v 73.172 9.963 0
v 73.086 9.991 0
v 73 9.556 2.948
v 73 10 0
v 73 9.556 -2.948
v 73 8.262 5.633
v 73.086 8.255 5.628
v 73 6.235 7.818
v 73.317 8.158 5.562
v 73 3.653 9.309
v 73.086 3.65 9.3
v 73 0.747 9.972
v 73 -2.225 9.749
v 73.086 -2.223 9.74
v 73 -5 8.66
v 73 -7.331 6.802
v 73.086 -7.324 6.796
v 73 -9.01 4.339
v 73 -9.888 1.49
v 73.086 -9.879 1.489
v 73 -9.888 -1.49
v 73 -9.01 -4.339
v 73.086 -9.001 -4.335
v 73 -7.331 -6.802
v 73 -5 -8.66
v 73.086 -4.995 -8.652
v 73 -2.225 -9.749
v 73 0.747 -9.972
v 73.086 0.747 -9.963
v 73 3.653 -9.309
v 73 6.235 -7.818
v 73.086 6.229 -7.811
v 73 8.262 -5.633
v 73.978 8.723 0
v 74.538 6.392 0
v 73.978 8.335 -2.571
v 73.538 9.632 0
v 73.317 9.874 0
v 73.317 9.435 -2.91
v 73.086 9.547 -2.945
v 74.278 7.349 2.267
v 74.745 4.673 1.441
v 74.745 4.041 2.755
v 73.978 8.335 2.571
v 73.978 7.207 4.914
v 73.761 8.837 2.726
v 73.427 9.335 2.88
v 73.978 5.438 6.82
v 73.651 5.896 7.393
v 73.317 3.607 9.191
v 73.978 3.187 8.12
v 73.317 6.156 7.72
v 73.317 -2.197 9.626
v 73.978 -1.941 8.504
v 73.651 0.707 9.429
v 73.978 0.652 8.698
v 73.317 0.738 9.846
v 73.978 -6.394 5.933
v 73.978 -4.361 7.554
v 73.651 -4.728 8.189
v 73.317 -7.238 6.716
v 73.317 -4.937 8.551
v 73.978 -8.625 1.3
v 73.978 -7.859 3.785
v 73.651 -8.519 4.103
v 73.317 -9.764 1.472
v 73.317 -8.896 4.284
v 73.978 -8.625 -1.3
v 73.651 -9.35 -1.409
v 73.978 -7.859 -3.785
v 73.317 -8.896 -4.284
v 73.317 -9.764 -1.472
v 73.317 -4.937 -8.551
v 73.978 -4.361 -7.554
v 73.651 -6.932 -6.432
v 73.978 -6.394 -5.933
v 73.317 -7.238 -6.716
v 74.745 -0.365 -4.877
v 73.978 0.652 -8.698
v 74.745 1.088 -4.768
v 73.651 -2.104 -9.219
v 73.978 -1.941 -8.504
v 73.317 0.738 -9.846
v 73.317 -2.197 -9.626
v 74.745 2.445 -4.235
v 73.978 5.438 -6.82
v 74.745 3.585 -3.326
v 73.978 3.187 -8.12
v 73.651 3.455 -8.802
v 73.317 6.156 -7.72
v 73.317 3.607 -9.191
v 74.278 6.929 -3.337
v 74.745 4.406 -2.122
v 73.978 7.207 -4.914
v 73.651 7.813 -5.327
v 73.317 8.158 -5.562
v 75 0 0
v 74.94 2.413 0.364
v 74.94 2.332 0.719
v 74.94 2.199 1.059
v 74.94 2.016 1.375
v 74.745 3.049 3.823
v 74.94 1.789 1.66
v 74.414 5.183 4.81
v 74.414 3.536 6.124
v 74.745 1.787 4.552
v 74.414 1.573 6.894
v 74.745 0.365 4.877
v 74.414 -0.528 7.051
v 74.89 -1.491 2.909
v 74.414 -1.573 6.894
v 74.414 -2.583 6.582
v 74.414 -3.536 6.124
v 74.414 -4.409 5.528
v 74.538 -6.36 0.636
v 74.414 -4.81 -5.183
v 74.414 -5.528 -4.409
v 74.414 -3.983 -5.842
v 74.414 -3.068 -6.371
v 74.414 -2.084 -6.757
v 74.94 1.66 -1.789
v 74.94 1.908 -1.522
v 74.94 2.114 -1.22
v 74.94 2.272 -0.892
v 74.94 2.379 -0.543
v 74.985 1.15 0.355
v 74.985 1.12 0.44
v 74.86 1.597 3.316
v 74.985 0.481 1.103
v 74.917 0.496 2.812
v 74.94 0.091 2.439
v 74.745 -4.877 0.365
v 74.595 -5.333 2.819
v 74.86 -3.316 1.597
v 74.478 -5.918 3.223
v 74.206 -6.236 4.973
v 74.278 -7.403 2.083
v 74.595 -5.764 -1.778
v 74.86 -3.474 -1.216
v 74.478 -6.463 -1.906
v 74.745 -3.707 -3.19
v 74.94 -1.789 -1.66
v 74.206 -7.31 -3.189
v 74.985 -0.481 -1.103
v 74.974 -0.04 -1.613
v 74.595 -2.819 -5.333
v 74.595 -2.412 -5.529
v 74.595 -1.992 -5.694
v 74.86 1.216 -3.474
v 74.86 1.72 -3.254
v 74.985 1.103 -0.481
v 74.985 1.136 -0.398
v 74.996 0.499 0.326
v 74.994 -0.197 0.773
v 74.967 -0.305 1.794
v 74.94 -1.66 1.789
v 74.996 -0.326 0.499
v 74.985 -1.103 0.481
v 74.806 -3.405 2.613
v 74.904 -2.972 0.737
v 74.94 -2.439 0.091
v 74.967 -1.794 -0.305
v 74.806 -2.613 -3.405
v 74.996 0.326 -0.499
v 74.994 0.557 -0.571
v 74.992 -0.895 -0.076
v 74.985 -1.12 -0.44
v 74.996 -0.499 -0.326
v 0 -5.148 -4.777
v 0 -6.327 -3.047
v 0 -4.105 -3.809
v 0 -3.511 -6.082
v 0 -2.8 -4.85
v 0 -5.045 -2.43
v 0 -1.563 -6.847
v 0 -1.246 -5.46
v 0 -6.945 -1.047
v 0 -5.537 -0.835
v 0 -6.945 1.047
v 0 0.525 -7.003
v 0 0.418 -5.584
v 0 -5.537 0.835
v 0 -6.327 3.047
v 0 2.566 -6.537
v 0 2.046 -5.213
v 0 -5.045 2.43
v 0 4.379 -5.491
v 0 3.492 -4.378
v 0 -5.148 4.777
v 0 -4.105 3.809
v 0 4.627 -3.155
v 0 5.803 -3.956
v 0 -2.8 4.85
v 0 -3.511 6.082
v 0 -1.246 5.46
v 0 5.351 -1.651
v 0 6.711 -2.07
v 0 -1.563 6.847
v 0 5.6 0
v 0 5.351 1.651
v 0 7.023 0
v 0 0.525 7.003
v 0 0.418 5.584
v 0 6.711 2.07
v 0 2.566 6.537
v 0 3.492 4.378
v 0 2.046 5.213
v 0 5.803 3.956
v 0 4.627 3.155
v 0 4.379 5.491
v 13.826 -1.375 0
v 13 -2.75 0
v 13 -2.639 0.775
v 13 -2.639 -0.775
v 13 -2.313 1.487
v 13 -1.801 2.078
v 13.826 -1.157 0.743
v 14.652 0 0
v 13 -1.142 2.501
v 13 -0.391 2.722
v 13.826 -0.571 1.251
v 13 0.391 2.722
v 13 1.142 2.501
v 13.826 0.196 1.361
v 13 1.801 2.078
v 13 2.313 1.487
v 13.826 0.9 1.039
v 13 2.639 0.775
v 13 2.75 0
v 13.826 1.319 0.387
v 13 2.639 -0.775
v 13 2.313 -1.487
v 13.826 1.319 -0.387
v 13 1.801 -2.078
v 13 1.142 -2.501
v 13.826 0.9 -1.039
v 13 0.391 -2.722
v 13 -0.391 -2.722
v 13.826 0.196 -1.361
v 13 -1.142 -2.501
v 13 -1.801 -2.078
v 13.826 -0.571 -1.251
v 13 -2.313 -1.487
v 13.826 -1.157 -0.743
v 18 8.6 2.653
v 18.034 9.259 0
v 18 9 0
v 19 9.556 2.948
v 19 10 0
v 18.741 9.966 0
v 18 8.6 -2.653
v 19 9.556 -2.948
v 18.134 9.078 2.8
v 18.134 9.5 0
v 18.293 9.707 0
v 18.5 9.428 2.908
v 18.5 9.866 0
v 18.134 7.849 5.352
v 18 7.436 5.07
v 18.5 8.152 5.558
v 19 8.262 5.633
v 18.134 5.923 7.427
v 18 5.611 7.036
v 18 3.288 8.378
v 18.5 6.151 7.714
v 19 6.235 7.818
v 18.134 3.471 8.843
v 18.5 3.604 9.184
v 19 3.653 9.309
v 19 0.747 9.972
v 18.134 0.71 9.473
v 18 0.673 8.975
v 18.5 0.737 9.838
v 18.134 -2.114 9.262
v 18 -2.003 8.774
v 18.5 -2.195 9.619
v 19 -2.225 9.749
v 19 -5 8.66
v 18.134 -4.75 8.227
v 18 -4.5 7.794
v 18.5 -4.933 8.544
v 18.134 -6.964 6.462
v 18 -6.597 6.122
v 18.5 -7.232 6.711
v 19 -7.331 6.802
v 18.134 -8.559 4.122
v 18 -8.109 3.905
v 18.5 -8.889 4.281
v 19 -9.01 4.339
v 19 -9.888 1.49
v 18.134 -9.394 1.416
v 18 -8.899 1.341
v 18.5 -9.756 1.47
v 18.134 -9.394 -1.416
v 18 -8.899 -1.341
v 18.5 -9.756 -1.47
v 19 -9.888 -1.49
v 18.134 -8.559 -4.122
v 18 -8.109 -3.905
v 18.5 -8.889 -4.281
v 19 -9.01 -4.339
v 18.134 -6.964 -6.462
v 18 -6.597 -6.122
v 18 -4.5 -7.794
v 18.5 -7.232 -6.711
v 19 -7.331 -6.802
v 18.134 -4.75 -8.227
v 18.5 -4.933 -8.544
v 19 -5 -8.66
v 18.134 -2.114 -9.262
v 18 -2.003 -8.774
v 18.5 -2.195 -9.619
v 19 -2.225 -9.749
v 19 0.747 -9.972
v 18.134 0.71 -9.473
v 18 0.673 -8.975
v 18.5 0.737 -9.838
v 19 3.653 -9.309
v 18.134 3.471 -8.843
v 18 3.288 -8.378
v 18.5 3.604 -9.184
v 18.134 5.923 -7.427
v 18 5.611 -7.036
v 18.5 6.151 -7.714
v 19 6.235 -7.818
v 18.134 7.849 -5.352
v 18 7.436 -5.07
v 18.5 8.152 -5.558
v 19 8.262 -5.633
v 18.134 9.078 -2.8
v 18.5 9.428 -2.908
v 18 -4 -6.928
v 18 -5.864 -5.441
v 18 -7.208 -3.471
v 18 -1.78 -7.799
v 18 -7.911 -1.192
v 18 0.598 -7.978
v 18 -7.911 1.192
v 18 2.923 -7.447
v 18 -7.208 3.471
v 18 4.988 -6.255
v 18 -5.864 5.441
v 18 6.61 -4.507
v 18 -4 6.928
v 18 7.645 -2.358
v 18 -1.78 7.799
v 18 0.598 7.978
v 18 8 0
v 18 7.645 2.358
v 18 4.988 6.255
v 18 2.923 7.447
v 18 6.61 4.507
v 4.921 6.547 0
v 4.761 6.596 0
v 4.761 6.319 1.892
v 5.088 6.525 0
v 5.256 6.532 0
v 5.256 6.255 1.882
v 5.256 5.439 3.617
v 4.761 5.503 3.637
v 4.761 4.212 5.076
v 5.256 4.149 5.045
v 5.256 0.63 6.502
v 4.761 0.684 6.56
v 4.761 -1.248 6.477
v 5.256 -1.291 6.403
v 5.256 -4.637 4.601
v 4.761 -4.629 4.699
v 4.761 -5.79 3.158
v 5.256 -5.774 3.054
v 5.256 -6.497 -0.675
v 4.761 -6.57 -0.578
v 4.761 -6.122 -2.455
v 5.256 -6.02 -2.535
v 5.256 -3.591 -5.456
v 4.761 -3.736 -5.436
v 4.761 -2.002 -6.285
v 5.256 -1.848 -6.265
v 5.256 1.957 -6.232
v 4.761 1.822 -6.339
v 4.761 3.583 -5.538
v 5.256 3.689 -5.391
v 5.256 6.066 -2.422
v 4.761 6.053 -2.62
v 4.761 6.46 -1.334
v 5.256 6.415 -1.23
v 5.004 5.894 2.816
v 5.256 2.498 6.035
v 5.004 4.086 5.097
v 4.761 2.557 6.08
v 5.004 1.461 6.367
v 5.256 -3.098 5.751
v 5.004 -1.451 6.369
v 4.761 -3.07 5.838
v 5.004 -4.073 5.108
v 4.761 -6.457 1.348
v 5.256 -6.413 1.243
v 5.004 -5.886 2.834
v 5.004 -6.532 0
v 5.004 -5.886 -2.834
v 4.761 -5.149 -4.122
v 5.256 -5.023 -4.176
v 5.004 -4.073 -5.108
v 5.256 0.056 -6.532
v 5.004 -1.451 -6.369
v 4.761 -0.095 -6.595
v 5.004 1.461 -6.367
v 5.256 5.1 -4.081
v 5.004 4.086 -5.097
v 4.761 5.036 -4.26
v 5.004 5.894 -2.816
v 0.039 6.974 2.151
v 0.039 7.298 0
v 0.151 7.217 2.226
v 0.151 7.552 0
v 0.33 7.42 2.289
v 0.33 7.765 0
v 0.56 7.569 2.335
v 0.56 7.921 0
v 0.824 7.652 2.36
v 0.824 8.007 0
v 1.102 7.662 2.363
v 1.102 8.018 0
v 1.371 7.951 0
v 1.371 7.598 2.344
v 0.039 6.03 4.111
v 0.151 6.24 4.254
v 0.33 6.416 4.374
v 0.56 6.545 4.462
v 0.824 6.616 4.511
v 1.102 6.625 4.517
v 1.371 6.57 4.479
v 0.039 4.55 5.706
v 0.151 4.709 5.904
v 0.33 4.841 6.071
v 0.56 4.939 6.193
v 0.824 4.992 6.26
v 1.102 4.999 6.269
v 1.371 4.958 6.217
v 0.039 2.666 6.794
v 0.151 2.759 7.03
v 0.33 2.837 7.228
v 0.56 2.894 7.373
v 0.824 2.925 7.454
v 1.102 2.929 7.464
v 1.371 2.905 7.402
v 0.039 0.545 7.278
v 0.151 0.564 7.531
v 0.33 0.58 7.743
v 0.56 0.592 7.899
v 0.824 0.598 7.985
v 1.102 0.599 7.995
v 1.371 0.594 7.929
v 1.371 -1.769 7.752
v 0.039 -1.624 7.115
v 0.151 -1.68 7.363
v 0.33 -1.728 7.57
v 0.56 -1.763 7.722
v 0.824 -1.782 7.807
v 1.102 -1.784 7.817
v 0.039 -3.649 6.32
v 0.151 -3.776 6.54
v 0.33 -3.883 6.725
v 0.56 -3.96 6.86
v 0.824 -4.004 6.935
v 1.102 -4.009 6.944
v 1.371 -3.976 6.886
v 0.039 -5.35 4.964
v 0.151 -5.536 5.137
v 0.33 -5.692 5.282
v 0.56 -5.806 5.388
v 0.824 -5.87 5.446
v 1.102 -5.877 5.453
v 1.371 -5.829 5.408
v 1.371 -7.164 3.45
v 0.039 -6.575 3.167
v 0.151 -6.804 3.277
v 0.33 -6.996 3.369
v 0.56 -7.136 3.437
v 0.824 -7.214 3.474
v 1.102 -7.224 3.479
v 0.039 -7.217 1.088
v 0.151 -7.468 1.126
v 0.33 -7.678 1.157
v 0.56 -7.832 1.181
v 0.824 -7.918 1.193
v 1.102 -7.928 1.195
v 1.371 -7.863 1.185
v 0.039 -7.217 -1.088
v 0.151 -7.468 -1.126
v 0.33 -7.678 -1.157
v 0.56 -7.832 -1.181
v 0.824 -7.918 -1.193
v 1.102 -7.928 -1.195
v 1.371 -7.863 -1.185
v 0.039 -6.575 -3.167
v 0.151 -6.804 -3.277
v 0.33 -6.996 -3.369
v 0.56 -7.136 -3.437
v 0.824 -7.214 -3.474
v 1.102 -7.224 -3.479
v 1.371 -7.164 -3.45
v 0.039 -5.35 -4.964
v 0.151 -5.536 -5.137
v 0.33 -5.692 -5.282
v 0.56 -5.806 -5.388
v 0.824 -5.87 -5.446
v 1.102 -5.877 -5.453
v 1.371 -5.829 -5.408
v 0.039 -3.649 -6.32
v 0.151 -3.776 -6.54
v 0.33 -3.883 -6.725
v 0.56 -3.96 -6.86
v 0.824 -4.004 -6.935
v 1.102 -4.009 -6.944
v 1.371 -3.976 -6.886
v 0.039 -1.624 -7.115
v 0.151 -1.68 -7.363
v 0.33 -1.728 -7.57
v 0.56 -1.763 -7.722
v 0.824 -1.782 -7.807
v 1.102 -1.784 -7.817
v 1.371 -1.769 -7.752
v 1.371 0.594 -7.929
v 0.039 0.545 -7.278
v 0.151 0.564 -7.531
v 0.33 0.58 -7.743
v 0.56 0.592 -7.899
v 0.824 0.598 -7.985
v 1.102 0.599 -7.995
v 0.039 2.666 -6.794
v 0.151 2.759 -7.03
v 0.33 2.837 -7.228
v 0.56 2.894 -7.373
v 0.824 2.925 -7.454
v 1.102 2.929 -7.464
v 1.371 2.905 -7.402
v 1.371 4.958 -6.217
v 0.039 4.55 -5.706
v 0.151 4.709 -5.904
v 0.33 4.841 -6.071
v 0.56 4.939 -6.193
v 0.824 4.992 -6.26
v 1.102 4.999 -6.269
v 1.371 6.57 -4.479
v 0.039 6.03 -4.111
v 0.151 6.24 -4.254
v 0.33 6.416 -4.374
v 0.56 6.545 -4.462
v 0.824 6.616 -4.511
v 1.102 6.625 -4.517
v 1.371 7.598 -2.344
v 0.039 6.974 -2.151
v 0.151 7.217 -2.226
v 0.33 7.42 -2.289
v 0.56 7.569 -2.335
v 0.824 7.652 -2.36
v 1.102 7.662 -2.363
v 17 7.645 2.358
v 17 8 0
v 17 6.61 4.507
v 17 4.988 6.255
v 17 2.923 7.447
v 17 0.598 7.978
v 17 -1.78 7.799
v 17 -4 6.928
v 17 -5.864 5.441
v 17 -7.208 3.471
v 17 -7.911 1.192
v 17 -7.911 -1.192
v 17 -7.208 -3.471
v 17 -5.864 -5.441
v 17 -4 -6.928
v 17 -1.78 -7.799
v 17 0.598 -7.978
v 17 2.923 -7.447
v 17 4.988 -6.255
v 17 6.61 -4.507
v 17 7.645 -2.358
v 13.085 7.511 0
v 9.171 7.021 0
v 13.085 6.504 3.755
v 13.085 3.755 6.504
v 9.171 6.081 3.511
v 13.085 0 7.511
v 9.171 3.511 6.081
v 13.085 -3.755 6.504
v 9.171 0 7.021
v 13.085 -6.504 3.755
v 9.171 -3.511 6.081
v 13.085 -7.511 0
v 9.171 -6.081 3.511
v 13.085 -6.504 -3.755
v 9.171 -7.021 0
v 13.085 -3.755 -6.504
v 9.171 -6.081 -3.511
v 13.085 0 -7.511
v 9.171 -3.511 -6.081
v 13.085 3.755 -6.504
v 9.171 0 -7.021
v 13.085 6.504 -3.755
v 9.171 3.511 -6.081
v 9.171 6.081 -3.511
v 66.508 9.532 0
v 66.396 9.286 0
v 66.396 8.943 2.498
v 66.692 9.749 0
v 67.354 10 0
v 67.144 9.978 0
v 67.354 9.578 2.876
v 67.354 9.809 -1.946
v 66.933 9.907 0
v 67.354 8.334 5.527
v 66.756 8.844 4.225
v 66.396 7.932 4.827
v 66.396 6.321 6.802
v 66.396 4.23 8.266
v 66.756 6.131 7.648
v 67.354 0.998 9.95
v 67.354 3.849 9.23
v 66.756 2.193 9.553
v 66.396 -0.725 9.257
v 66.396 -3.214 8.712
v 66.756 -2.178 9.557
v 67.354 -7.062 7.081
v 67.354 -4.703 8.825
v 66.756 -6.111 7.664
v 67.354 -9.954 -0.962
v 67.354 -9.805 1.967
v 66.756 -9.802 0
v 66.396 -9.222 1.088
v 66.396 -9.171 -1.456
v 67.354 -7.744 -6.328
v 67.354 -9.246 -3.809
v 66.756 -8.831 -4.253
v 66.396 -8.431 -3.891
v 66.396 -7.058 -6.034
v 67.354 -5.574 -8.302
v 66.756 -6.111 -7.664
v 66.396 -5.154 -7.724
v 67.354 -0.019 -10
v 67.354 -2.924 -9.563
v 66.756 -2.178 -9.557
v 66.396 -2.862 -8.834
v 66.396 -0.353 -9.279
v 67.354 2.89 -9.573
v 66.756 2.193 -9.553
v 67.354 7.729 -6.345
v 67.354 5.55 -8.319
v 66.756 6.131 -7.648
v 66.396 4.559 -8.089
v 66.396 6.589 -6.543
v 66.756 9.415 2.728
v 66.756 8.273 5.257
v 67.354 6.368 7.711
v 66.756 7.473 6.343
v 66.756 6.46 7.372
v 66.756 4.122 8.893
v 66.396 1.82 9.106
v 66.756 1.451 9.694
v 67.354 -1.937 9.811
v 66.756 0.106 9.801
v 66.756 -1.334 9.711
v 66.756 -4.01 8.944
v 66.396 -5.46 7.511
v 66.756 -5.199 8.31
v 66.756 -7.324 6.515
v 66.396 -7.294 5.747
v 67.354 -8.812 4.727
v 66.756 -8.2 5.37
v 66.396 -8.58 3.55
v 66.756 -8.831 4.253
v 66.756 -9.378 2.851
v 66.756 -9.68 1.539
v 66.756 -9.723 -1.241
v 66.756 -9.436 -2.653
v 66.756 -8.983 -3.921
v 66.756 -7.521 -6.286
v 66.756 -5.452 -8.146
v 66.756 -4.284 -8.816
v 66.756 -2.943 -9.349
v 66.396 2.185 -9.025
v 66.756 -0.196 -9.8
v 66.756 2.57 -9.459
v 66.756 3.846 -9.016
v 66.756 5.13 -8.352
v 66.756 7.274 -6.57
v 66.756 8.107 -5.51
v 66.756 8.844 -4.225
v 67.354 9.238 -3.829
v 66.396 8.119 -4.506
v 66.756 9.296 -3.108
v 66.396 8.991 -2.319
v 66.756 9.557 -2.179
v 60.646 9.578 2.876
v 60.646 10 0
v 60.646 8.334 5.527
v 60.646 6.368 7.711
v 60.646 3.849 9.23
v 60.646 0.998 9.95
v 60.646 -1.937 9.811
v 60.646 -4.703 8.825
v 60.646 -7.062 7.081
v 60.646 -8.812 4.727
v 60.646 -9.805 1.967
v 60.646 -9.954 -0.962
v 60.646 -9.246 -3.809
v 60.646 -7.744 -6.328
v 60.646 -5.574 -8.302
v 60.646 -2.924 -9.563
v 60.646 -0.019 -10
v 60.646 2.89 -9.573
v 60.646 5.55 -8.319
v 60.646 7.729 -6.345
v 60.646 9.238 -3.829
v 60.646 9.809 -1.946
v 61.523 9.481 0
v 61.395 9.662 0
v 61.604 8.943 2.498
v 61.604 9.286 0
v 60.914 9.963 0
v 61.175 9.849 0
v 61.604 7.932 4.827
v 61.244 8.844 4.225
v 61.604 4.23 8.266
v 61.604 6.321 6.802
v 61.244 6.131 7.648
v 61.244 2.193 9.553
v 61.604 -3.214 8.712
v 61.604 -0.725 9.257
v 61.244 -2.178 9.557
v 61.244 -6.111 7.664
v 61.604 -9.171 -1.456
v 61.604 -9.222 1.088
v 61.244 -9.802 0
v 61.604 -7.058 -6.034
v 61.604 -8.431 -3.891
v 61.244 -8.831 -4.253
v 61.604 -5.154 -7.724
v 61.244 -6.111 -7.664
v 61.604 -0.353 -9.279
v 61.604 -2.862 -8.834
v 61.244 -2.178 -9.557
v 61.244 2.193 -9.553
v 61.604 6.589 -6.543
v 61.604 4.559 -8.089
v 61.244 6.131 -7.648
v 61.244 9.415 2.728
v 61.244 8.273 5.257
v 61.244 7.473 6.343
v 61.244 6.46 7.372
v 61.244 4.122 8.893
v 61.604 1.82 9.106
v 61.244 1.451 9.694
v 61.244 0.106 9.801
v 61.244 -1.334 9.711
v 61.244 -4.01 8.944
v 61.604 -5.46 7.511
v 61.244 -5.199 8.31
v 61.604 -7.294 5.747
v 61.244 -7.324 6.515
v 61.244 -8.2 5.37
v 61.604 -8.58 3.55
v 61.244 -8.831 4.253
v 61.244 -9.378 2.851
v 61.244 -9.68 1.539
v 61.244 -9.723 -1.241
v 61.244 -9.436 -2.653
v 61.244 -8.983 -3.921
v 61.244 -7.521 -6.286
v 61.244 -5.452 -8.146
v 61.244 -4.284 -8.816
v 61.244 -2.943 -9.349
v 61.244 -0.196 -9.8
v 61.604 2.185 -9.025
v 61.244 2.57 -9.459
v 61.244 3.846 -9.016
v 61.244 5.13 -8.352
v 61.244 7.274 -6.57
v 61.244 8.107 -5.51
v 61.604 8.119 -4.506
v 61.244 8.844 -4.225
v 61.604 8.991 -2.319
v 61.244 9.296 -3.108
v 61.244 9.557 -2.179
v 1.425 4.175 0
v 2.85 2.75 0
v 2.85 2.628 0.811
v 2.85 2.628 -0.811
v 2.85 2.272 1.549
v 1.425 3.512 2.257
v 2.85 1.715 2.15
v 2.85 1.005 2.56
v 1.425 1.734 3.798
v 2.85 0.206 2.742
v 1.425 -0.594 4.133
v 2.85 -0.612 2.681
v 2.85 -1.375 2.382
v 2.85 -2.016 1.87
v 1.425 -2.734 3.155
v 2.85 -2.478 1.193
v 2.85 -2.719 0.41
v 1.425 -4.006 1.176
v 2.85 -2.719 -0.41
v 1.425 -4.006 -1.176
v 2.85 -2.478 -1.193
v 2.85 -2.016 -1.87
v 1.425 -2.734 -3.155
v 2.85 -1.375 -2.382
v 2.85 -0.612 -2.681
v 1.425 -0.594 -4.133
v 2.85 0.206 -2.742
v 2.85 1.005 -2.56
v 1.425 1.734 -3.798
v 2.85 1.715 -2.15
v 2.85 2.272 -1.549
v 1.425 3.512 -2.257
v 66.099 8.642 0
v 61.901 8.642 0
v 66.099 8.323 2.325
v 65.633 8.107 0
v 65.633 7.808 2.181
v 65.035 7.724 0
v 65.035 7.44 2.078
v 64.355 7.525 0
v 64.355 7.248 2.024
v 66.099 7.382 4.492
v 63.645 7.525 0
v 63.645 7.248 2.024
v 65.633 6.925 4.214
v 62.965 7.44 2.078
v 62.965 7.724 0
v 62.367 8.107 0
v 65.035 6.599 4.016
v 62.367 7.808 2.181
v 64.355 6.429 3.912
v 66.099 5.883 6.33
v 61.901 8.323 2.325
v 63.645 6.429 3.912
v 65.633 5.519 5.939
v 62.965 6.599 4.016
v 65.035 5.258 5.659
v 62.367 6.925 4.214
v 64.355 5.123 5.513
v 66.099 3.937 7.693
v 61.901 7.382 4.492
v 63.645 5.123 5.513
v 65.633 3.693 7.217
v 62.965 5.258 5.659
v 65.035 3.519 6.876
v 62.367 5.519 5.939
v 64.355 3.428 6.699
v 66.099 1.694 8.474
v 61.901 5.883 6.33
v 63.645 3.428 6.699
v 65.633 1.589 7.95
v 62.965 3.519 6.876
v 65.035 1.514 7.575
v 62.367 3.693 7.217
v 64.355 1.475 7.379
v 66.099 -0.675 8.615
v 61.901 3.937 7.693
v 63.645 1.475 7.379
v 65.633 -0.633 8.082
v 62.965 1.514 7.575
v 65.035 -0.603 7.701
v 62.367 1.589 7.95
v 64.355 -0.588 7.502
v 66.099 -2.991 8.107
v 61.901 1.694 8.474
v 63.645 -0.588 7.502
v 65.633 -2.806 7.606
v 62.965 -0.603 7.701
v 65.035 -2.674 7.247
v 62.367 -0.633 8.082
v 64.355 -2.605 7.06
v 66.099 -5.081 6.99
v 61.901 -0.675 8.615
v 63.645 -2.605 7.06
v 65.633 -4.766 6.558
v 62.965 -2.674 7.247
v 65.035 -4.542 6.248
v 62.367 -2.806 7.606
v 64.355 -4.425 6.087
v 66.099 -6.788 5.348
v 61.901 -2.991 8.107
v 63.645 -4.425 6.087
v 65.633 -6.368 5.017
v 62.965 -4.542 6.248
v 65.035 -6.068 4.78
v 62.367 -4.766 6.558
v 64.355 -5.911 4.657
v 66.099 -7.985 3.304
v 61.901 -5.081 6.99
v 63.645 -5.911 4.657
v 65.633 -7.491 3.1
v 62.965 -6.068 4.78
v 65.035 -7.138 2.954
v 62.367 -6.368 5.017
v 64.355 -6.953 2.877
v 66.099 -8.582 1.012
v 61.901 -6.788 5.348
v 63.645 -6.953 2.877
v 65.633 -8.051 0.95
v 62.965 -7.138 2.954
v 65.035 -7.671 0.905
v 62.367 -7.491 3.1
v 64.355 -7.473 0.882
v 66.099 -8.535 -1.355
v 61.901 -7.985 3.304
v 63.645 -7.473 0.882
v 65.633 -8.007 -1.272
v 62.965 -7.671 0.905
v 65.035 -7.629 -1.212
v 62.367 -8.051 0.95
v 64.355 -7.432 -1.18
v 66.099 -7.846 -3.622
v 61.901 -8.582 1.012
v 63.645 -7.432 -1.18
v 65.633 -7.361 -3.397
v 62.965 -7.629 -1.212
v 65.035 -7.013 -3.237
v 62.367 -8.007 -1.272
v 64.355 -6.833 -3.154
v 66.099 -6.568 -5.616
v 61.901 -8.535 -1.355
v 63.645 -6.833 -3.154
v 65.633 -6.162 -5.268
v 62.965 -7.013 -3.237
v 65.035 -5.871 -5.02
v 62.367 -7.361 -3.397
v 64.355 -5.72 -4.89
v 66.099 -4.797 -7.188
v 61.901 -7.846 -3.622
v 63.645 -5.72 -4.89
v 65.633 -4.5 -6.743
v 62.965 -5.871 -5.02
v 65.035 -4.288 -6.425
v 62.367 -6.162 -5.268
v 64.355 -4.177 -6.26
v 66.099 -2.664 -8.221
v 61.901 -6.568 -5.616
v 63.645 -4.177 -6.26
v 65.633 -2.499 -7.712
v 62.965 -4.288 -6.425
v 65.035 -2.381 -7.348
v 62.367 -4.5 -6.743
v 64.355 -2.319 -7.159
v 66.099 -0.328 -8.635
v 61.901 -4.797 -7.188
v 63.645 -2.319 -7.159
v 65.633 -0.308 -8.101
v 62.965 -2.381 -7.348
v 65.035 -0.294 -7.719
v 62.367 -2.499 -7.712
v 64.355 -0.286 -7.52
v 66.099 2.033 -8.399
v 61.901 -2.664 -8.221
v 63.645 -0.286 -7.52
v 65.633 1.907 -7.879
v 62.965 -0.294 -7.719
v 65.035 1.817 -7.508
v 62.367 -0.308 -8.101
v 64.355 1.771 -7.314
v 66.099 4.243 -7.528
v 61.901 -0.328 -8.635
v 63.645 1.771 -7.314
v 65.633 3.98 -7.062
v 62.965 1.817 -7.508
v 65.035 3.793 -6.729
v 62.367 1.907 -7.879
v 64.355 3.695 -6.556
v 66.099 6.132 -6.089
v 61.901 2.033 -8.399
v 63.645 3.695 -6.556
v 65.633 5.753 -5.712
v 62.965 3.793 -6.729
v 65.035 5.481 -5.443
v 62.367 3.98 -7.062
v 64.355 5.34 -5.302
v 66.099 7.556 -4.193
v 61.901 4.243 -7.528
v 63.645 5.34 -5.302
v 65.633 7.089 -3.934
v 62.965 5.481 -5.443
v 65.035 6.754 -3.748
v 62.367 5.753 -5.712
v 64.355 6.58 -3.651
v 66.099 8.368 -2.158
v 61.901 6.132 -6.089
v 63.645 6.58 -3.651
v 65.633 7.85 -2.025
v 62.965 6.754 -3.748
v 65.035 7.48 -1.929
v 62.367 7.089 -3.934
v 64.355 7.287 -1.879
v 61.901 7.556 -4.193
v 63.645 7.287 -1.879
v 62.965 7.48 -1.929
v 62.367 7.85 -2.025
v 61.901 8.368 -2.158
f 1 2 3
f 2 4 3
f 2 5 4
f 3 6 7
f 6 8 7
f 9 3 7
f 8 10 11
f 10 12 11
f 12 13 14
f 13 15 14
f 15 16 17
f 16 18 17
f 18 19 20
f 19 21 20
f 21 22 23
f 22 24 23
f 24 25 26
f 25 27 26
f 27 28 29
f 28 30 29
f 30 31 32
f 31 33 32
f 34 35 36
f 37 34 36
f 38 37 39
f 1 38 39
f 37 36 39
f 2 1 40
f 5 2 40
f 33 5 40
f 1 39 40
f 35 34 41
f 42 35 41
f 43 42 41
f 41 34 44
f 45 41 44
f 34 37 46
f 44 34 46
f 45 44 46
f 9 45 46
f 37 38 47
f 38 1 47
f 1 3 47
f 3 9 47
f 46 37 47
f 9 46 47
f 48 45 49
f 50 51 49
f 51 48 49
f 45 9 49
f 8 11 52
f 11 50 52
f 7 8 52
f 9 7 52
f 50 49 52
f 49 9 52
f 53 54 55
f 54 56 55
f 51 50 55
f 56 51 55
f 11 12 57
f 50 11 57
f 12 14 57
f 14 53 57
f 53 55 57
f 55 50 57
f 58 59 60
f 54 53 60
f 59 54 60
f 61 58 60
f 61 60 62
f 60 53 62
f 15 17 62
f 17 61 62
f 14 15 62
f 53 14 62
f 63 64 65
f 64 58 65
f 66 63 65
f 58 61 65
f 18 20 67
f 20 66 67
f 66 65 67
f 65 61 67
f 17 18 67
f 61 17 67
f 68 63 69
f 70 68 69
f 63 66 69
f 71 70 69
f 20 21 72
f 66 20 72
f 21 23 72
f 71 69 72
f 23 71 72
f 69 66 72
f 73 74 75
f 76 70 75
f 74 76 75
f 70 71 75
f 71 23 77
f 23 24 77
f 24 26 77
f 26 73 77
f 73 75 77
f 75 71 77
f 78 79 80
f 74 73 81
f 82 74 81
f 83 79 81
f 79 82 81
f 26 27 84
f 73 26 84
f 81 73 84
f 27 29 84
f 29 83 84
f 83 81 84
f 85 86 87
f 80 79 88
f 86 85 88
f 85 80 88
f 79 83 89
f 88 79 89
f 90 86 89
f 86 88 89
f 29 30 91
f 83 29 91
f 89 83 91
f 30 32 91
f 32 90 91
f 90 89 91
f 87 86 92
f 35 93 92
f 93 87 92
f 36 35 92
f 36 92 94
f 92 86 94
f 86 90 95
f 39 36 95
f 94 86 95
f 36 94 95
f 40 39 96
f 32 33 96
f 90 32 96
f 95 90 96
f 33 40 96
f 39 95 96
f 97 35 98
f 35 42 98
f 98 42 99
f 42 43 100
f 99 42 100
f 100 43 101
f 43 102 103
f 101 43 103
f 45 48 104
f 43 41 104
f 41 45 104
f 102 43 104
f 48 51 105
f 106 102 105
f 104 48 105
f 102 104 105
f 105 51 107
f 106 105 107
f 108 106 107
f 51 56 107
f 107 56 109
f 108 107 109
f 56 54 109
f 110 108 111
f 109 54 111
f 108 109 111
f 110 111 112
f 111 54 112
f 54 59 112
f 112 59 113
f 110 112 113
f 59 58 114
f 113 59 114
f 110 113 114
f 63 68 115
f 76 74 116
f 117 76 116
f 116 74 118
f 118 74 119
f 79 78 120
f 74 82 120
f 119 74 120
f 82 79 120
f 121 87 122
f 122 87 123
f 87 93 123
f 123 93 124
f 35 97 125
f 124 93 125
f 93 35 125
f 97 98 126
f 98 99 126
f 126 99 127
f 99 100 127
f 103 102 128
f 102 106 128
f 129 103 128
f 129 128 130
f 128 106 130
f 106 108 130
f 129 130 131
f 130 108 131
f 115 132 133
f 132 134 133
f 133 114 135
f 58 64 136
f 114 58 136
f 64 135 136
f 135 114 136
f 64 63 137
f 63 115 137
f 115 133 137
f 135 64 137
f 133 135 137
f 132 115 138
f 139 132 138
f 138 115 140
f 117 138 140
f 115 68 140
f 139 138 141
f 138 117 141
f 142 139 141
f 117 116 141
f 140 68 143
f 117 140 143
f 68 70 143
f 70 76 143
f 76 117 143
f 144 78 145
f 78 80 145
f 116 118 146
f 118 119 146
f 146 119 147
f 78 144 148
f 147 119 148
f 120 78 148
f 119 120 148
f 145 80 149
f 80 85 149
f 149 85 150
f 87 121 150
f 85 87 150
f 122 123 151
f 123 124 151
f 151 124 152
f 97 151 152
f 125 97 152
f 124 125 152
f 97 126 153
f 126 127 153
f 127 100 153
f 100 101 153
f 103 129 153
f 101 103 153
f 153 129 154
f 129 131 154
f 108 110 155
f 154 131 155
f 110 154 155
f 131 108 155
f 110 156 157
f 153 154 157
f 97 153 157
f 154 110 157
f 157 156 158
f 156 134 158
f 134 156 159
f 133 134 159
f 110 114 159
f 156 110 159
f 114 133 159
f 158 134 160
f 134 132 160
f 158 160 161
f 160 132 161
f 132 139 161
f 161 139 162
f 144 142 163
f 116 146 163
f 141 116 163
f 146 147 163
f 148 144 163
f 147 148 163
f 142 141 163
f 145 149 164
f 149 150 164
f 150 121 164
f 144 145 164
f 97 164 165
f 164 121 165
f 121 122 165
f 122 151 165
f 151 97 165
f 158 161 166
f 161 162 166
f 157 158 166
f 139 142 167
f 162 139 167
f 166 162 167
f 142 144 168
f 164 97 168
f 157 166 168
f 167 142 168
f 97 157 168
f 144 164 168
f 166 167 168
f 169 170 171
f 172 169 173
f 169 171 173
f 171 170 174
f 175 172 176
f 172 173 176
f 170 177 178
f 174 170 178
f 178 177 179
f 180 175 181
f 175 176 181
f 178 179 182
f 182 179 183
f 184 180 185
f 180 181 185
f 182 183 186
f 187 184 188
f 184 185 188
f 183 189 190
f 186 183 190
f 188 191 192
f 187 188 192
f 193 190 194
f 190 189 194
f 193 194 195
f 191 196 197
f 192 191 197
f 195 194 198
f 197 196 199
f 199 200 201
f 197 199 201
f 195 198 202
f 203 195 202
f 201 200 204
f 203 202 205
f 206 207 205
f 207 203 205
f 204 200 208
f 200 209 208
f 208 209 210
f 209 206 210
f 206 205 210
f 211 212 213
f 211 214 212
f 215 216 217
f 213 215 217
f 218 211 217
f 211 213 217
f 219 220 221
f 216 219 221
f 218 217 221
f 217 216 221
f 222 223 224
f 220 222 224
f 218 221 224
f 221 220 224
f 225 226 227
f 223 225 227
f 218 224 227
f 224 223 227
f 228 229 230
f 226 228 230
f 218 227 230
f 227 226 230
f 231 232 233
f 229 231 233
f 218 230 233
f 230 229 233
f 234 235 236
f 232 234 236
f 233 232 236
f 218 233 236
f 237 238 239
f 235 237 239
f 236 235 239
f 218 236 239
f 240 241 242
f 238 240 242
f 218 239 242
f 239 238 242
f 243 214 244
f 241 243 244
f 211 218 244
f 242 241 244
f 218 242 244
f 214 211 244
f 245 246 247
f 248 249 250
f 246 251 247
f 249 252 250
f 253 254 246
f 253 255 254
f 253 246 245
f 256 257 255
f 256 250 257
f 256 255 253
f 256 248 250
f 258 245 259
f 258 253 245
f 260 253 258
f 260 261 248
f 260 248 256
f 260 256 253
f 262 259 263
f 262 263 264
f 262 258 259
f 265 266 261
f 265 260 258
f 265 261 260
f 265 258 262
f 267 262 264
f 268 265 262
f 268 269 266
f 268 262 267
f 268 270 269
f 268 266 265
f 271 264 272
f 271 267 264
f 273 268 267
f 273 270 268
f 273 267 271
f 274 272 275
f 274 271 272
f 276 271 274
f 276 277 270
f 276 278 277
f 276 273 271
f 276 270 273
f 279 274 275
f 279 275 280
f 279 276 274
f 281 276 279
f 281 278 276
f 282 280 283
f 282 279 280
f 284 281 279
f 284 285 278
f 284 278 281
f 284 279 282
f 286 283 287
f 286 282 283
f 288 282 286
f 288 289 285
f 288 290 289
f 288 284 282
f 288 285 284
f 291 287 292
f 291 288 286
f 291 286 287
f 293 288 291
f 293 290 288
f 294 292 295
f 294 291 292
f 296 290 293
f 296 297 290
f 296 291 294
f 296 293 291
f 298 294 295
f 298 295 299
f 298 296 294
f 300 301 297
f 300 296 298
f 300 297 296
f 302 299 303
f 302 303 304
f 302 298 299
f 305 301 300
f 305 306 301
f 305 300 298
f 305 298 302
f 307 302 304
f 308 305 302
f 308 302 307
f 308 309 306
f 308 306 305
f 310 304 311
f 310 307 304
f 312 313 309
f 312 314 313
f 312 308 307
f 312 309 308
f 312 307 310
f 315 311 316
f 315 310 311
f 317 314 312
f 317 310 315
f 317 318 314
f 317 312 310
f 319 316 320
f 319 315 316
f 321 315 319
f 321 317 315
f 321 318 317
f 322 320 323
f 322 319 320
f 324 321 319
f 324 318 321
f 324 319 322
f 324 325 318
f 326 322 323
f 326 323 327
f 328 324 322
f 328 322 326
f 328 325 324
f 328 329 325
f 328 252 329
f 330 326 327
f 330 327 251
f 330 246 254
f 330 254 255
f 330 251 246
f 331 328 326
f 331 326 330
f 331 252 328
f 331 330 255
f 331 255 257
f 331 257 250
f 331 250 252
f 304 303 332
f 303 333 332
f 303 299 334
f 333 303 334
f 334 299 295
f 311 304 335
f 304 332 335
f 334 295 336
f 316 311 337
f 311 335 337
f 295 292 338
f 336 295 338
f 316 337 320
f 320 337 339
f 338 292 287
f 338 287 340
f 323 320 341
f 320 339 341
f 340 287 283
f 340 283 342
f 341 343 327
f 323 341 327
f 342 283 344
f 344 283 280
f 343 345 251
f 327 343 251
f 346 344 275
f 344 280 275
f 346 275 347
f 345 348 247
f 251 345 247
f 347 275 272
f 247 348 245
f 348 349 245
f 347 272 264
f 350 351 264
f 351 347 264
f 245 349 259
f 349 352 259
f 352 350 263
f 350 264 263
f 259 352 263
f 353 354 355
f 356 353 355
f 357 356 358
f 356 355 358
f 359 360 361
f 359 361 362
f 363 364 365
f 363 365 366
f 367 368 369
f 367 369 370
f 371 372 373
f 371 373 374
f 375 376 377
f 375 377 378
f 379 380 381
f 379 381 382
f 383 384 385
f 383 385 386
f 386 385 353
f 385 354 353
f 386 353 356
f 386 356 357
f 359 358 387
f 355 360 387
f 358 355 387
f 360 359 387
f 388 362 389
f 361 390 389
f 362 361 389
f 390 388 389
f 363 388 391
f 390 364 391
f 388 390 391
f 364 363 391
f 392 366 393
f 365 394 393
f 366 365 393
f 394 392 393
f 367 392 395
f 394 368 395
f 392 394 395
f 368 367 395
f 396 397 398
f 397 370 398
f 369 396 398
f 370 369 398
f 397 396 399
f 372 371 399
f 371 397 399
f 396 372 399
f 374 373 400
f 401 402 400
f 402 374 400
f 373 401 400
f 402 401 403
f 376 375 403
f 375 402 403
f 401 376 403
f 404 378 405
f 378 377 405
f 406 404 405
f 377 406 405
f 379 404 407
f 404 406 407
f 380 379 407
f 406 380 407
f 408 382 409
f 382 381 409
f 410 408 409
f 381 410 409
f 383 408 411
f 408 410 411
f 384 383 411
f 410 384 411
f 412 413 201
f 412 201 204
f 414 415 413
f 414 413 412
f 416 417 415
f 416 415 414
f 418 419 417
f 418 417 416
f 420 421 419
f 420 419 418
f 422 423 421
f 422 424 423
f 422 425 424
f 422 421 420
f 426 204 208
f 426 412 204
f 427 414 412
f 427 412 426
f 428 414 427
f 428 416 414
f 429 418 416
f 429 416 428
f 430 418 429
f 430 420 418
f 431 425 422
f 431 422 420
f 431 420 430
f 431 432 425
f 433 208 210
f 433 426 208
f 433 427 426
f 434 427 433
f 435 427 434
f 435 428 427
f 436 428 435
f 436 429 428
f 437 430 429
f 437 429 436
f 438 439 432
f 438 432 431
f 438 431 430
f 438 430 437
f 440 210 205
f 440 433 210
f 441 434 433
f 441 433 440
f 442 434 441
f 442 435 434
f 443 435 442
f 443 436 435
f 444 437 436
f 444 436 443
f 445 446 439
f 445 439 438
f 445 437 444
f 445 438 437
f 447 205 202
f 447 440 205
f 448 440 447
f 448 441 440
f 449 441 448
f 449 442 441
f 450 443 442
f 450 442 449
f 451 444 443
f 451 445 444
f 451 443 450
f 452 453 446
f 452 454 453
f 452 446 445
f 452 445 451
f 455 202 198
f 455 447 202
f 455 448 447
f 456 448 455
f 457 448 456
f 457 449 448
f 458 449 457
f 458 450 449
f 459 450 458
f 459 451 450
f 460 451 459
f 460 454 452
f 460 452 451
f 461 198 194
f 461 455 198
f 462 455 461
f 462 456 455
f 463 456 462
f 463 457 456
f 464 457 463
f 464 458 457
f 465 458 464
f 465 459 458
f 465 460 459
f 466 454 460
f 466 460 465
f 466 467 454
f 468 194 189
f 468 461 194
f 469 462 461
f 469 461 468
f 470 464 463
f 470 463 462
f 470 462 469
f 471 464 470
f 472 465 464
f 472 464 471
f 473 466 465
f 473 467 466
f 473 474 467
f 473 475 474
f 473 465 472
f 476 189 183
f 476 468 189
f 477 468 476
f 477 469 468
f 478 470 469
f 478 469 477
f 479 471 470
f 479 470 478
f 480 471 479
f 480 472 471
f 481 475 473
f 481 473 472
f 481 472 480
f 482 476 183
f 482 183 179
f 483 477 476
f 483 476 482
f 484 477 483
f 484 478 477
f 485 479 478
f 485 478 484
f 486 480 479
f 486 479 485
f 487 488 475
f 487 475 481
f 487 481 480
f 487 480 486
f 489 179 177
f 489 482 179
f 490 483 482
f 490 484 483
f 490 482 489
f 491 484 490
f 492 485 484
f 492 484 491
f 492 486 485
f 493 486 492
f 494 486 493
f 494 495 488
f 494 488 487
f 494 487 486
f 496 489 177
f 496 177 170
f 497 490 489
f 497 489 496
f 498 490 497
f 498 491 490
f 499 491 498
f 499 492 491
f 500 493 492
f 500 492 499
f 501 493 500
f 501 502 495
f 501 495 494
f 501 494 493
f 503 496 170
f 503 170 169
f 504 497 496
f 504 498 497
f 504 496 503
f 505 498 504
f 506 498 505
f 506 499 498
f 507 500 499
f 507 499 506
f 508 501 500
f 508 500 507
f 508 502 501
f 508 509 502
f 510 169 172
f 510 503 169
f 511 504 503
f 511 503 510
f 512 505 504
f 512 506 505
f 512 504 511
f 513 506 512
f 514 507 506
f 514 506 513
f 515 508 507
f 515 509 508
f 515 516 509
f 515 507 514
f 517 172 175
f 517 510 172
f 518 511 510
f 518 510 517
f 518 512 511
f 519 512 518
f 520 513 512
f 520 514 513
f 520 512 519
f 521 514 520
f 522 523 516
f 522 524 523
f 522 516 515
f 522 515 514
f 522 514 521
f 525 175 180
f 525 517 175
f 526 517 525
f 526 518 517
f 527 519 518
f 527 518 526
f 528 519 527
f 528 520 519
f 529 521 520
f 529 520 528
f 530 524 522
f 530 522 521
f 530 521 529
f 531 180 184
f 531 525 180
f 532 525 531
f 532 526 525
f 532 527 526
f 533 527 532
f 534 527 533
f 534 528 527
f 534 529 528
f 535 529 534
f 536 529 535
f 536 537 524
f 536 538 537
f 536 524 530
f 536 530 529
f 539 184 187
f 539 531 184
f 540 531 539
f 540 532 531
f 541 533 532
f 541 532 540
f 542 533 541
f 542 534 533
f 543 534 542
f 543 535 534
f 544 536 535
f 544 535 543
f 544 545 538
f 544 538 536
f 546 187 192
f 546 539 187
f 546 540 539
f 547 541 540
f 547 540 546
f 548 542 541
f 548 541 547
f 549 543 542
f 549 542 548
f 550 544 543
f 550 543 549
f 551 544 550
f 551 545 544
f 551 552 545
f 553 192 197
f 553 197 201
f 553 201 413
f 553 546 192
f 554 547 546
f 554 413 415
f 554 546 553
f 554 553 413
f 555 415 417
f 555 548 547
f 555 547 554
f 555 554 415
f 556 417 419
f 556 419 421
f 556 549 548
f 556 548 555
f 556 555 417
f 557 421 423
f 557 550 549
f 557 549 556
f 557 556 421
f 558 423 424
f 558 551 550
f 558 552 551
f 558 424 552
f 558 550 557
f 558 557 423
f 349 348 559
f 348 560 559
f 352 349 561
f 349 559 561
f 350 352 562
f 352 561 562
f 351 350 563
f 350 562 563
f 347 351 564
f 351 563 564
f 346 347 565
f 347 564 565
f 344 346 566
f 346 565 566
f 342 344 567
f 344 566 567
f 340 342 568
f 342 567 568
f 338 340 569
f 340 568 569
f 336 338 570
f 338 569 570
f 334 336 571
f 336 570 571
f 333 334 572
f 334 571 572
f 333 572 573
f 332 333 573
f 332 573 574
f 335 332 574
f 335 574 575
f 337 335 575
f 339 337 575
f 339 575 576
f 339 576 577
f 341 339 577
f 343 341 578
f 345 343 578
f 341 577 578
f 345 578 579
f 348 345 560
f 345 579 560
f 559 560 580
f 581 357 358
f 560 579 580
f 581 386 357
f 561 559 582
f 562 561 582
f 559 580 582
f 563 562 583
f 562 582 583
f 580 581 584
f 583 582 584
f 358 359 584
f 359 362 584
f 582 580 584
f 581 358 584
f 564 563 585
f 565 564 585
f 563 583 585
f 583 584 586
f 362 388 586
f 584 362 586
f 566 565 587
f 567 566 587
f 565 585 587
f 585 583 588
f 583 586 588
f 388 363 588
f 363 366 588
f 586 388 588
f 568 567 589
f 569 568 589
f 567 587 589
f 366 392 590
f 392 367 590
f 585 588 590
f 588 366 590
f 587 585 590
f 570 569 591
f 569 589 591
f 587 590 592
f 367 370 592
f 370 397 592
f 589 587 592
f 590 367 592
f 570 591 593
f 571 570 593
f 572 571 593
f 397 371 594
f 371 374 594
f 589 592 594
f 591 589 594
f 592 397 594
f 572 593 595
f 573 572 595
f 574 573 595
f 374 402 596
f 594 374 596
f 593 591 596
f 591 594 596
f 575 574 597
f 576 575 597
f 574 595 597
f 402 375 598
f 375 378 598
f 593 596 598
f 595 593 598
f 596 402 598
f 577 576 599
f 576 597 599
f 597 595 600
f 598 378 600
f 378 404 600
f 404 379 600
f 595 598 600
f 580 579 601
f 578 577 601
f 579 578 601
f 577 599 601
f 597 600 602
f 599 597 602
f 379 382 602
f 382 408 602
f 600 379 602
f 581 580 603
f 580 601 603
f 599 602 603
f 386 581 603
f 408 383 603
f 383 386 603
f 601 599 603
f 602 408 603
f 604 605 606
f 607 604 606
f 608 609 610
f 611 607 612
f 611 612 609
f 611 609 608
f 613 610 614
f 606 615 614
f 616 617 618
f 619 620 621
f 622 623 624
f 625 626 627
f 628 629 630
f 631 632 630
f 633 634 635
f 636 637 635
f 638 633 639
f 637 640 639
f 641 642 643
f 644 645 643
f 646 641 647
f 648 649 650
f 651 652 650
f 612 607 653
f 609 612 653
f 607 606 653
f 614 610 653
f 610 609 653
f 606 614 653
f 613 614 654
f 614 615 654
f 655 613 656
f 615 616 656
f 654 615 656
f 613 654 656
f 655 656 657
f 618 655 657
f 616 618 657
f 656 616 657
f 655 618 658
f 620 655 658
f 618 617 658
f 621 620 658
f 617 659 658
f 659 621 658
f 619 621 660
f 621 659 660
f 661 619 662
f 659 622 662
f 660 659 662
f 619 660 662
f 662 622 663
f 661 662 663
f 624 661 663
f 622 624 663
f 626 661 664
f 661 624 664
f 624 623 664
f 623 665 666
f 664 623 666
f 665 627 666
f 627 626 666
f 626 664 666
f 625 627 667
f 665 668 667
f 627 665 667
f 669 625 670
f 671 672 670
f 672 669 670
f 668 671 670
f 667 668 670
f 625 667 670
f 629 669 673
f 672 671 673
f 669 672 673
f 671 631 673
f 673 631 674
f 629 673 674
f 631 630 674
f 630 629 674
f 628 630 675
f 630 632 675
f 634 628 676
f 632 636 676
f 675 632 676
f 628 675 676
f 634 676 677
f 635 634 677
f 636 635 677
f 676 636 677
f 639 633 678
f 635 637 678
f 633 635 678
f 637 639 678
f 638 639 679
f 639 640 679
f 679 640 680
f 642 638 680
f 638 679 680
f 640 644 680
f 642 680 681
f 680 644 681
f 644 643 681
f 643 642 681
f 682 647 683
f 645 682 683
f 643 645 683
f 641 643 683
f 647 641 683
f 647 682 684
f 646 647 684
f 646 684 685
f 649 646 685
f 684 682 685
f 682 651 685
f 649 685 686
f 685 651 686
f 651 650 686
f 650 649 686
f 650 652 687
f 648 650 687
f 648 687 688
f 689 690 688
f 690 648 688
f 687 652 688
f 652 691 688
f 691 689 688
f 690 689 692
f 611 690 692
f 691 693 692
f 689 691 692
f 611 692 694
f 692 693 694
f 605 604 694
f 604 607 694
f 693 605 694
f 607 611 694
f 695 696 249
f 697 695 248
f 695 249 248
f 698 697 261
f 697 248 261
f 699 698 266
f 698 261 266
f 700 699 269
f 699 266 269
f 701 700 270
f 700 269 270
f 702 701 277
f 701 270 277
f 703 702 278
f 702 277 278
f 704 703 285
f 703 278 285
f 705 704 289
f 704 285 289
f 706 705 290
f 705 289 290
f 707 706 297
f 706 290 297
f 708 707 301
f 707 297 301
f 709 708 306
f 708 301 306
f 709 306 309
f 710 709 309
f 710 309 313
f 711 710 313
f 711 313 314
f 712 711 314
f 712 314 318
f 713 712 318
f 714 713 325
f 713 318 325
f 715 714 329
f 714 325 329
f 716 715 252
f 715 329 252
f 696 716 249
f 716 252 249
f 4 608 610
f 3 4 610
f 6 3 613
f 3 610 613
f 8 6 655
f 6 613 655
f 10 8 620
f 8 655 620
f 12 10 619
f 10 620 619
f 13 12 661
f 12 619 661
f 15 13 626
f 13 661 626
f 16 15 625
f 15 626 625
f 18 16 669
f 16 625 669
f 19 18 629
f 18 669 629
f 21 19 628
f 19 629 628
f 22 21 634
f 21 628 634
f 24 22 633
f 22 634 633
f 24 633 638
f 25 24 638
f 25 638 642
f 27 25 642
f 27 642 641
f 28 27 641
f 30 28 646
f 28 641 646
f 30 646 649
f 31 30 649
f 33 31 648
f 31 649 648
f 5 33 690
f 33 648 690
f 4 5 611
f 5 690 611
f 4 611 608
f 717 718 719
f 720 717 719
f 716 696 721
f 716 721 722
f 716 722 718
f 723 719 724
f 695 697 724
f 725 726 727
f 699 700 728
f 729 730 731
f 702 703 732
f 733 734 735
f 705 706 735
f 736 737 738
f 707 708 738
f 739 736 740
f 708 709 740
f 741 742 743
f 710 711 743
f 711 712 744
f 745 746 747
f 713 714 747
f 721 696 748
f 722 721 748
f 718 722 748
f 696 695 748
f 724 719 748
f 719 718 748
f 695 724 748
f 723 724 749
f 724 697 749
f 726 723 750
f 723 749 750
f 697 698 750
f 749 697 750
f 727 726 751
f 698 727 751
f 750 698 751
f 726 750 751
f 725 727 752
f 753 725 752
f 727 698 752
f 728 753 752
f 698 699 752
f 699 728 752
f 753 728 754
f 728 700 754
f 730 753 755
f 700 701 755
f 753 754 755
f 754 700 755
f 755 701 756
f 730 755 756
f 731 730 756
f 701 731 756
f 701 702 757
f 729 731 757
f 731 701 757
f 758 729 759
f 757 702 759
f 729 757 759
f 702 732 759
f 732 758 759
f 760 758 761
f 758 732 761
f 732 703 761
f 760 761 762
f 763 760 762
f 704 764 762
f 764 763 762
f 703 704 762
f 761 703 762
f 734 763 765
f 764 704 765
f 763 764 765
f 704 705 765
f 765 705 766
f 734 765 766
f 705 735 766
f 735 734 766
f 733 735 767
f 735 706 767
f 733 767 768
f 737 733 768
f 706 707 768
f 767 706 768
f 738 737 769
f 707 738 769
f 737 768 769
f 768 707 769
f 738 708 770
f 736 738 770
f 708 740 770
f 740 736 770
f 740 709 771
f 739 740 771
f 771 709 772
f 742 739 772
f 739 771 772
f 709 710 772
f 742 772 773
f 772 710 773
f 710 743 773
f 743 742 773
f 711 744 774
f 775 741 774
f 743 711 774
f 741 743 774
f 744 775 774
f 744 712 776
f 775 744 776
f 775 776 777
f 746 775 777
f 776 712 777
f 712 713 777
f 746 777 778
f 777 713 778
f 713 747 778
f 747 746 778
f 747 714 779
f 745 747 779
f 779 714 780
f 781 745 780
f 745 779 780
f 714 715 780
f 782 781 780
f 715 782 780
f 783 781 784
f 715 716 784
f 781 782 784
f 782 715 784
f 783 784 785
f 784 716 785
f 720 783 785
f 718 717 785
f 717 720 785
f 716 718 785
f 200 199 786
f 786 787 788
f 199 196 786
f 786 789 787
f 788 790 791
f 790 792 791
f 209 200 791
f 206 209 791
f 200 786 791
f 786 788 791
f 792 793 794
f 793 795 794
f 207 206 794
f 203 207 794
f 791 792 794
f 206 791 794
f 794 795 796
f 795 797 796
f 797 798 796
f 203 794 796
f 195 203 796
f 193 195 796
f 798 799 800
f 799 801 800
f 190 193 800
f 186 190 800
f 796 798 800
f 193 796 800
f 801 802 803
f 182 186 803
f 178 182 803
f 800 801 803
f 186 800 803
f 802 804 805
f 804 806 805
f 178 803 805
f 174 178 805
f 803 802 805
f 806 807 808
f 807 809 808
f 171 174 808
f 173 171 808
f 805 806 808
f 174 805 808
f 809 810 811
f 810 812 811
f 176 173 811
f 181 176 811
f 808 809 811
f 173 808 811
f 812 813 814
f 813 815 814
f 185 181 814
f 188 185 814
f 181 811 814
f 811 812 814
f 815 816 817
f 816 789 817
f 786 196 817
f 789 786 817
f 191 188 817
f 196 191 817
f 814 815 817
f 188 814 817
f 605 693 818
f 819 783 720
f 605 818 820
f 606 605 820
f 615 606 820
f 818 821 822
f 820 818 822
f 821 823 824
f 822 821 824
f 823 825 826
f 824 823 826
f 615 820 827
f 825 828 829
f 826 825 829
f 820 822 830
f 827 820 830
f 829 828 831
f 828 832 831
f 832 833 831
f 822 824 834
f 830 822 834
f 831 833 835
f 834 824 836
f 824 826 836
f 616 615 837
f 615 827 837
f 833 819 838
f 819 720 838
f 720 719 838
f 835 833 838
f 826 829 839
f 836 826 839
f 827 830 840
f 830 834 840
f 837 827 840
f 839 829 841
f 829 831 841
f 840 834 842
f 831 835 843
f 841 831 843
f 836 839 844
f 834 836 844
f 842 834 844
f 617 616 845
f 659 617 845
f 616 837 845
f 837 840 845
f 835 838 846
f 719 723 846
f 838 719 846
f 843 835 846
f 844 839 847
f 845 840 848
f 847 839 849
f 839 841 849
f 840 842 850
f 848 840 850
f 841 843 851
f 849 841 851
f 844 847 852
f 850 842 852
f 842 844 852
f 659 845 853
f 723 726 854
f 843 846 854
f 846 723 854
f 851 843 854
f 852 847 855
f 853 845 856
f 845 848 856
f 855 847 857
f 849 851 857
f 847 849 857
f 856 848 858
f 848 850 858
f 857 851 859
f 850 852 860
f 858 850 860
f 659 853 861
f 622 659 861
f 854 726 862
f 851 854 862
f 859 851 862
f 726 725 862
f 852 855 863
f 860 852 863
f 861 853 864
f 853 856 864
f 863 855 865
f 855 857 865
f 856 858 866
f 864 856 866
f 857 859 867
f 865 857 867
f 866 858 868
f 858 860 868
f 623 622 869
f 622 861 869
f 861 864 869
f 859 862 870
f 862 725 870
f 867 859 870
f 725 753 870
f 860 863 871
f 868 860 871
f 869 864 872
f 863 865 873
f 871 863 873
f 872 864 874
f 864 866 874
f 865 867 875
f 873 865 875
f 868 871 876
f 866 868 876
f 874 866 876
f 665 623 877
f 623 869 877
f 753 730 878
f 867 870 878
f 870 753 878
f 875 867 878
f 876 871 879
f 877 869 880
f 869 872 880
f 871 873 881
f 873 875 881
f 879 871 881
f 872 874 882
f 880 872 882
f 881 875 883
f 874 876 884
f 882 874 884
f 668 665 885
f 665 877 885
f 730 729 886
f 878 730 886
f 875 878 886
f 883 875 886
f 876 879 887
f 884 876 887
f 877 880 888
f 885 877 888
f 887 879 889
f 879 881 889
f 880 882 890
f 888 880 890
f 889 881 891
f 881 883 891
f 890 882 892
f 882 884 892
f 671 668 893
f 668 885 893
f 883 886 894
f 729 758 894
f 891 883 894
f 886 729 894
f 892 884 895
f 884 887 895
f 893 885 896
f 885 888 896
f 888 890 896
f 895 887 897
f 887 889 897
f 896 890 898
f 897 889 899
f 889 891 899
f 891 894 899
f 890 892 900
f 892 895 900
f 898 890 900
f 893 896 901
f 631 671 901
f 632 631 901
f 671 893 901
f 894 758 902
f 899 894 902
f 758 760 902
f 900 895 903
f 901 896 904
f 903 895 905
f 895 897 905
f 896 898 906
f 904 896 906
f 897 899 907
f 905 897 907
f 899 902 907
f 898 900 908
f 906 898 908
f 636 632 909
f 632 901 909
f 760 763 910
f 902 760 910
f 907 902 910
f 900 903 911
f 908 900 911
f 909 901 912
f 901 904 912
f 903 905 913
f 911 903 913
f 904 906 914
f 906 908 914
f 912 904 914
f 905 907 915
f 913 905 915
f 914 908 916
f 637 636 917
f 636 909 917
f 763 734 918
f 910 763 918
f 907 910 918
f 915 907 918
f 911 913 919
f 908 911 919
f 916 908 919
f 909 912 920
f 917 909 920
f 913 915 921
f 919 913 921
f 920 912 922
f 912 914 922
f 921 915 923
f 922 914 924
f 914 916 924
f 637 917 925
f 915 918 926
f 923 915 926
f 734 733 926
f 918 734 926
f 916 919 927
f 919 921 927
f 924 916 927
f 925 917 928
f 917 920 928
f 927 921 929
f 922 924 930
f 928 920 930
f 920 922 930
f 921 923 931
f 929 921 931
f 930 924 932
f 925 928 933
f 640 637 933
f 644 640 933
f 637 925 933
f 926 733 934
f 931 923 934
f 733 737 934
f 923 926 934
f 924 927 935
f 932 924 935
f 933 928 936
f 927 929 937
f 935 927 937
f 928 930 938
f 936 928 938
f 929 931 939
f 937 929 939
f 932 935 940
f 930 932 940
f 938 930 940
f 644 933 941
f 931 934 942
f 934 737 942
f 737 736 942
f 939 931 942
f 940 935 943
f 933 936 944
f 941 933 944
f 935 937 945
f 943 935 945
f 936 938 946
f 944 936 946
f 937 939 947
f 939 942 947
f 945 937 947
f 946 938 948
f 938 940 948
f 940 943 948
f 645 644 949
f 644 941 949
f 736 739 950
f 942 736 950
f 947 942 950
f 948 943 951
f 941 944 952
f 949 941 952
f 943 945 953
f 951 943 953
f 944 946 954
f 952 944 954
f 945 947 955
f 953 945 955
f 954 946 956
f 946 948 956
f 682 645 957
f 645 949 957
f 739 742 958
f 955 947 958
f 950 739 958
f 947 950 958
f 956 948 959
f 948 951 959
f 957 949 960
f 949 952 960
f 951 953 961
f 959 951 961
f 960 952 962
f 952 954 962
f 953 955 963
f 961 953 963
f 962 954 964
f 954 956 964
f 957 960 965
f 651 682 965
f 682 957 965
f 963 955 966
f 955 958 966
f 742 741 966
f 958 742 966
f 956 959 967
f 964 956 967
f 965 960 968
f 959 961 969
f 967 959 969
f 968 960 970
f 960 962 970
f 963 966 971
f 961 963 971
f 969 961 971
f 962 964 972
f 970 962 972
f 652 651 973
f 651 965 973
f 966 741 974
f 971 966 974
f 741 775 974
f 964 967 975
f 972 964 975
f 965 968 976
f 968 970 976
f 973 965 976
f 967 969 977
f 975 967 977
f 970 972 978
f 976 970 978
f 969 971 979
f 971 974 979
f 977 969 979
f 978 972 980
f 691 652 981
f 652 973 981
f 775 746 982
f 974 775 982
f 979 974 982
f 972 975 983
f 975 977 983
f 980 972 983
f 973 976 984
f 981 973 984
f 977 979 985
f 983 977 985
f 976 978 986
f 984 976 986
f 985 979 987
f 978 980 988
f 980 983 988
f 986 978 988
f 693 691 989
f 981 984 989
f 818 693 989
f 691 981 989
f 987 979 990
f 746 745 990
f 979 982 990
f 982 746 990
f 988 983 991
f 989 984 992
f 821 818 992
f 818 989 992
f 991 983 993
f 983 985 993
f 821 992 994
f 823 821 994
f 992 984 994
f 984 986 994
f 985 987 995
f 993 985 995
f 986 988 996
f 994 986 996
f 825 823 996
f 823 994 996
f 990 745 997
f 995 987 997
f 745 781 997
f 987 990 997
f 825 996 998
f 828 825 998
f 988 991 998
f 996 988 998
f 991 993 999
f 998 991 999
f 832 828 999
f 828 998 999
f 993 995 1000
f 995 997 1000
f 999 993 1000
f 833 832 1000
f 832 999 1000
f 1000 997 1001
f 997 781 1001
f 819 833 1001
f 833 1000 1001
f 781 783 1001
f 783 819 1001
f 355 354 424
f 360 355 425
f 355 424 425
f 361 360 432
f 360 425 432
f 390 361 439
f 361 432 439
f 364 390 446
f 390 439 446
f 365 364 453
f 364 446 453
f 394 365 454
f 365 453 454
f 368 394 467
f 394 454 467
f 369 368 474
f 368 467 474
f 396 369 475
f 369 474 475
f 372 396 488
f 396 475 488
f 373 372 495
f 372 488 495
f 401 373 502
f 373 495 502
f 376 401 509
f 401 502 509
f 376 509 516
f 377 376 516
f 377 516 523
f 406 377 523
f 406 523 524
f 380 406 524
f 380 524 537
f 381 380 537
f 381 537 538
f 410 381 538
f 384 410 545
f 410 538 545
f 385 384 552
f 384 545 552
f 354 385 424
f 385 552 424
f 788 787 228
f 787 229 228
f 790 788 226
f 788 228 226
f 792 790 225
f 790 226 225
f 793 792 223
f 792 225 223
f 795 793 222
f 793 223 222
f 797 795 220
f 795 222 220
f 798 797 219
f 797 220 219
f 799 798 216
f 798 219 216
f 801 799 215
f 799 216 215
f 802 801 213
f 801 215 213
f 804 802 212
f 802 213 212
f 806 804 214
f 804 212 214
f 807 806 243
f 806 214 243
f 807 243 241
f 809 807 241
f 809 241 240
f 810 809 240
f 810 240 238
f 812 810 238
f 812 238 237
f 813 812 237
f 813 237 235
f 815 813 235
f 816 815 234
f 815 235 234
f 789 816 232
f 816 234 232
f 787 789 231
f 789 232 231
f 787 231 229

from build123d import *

# Parameters (mm, degrees)
F3_D           = 5.5
F3_DEPTH       = 13
F3_CSINK_D     = 11.2
F3_CSINK_ANGLE = 90
F3_TIP         = 1.6523667023
F4_R           = 1


with BuildPart() as f1:
    # F0 (on Top) → F1 (revolve)
    with BuildSketch(Plane.XY):
        with BuildLine():
            Line((0, 8.5), (0, 0))
            Line((0, 0), (75, 0))
            add(Edge.make_bspline(
                [(75, 0), (75, 10), (73, 10)],
                knots=[4.7123889804, 4.7123889804, 4.7123889804, 6.2831853072, 6.2831853072, 6.2831853072], degree=2, weights=[1, 0.7071067812, 1]))
            Line((73, 10), (66.5, 10))
            ThreePointArc((66.5, 10), (64, 7.5), (61.5, 10))
            Line((61.5, 10), (18, 10))
            Line((18, 10), (18, 8))
            Line((18, 8), (17, 8))
            Line((17, 8), (5, 6.5))
            Line((5, 6.5), (0, 8.5))
        make_face()
    revolve(axis=Axis((45.1035350561, 0, 0), (1, 0, 0)))

    # F3
    with Locations(Plane(origin=(0, 0, 0), x_dir=(0, -1, 0), z_dir=(-1, 0, 0))):
        with Locations((0, 0)):
            CounterSinkHole(F3_D / 2, F3_CSINK_D / 2, depth=F3_DEPTH, counter_sink_angle=F3_CSINK_ANGLE)
            with Locations((0, 0, -(F3_DEPTH + F3_TIP / 2))):  # 118° drill point
                Cone(0, F3_D / 2, F3_TIP, mode=Mode.SUBTRACT)

    # F4
    f4_edges = [f1.edges().sort_by_distance(p)[0] for p in [
        (5, -6.5, 0),
        (18, -10, 0),
        (66.5, -10, 0),
        (61.5, -10, 0),
        (73, -10, 0),
        (0, -8.5, 0),
    ]]
    fillet(f4_edges, radius=F4_R)


solid = f1.part
